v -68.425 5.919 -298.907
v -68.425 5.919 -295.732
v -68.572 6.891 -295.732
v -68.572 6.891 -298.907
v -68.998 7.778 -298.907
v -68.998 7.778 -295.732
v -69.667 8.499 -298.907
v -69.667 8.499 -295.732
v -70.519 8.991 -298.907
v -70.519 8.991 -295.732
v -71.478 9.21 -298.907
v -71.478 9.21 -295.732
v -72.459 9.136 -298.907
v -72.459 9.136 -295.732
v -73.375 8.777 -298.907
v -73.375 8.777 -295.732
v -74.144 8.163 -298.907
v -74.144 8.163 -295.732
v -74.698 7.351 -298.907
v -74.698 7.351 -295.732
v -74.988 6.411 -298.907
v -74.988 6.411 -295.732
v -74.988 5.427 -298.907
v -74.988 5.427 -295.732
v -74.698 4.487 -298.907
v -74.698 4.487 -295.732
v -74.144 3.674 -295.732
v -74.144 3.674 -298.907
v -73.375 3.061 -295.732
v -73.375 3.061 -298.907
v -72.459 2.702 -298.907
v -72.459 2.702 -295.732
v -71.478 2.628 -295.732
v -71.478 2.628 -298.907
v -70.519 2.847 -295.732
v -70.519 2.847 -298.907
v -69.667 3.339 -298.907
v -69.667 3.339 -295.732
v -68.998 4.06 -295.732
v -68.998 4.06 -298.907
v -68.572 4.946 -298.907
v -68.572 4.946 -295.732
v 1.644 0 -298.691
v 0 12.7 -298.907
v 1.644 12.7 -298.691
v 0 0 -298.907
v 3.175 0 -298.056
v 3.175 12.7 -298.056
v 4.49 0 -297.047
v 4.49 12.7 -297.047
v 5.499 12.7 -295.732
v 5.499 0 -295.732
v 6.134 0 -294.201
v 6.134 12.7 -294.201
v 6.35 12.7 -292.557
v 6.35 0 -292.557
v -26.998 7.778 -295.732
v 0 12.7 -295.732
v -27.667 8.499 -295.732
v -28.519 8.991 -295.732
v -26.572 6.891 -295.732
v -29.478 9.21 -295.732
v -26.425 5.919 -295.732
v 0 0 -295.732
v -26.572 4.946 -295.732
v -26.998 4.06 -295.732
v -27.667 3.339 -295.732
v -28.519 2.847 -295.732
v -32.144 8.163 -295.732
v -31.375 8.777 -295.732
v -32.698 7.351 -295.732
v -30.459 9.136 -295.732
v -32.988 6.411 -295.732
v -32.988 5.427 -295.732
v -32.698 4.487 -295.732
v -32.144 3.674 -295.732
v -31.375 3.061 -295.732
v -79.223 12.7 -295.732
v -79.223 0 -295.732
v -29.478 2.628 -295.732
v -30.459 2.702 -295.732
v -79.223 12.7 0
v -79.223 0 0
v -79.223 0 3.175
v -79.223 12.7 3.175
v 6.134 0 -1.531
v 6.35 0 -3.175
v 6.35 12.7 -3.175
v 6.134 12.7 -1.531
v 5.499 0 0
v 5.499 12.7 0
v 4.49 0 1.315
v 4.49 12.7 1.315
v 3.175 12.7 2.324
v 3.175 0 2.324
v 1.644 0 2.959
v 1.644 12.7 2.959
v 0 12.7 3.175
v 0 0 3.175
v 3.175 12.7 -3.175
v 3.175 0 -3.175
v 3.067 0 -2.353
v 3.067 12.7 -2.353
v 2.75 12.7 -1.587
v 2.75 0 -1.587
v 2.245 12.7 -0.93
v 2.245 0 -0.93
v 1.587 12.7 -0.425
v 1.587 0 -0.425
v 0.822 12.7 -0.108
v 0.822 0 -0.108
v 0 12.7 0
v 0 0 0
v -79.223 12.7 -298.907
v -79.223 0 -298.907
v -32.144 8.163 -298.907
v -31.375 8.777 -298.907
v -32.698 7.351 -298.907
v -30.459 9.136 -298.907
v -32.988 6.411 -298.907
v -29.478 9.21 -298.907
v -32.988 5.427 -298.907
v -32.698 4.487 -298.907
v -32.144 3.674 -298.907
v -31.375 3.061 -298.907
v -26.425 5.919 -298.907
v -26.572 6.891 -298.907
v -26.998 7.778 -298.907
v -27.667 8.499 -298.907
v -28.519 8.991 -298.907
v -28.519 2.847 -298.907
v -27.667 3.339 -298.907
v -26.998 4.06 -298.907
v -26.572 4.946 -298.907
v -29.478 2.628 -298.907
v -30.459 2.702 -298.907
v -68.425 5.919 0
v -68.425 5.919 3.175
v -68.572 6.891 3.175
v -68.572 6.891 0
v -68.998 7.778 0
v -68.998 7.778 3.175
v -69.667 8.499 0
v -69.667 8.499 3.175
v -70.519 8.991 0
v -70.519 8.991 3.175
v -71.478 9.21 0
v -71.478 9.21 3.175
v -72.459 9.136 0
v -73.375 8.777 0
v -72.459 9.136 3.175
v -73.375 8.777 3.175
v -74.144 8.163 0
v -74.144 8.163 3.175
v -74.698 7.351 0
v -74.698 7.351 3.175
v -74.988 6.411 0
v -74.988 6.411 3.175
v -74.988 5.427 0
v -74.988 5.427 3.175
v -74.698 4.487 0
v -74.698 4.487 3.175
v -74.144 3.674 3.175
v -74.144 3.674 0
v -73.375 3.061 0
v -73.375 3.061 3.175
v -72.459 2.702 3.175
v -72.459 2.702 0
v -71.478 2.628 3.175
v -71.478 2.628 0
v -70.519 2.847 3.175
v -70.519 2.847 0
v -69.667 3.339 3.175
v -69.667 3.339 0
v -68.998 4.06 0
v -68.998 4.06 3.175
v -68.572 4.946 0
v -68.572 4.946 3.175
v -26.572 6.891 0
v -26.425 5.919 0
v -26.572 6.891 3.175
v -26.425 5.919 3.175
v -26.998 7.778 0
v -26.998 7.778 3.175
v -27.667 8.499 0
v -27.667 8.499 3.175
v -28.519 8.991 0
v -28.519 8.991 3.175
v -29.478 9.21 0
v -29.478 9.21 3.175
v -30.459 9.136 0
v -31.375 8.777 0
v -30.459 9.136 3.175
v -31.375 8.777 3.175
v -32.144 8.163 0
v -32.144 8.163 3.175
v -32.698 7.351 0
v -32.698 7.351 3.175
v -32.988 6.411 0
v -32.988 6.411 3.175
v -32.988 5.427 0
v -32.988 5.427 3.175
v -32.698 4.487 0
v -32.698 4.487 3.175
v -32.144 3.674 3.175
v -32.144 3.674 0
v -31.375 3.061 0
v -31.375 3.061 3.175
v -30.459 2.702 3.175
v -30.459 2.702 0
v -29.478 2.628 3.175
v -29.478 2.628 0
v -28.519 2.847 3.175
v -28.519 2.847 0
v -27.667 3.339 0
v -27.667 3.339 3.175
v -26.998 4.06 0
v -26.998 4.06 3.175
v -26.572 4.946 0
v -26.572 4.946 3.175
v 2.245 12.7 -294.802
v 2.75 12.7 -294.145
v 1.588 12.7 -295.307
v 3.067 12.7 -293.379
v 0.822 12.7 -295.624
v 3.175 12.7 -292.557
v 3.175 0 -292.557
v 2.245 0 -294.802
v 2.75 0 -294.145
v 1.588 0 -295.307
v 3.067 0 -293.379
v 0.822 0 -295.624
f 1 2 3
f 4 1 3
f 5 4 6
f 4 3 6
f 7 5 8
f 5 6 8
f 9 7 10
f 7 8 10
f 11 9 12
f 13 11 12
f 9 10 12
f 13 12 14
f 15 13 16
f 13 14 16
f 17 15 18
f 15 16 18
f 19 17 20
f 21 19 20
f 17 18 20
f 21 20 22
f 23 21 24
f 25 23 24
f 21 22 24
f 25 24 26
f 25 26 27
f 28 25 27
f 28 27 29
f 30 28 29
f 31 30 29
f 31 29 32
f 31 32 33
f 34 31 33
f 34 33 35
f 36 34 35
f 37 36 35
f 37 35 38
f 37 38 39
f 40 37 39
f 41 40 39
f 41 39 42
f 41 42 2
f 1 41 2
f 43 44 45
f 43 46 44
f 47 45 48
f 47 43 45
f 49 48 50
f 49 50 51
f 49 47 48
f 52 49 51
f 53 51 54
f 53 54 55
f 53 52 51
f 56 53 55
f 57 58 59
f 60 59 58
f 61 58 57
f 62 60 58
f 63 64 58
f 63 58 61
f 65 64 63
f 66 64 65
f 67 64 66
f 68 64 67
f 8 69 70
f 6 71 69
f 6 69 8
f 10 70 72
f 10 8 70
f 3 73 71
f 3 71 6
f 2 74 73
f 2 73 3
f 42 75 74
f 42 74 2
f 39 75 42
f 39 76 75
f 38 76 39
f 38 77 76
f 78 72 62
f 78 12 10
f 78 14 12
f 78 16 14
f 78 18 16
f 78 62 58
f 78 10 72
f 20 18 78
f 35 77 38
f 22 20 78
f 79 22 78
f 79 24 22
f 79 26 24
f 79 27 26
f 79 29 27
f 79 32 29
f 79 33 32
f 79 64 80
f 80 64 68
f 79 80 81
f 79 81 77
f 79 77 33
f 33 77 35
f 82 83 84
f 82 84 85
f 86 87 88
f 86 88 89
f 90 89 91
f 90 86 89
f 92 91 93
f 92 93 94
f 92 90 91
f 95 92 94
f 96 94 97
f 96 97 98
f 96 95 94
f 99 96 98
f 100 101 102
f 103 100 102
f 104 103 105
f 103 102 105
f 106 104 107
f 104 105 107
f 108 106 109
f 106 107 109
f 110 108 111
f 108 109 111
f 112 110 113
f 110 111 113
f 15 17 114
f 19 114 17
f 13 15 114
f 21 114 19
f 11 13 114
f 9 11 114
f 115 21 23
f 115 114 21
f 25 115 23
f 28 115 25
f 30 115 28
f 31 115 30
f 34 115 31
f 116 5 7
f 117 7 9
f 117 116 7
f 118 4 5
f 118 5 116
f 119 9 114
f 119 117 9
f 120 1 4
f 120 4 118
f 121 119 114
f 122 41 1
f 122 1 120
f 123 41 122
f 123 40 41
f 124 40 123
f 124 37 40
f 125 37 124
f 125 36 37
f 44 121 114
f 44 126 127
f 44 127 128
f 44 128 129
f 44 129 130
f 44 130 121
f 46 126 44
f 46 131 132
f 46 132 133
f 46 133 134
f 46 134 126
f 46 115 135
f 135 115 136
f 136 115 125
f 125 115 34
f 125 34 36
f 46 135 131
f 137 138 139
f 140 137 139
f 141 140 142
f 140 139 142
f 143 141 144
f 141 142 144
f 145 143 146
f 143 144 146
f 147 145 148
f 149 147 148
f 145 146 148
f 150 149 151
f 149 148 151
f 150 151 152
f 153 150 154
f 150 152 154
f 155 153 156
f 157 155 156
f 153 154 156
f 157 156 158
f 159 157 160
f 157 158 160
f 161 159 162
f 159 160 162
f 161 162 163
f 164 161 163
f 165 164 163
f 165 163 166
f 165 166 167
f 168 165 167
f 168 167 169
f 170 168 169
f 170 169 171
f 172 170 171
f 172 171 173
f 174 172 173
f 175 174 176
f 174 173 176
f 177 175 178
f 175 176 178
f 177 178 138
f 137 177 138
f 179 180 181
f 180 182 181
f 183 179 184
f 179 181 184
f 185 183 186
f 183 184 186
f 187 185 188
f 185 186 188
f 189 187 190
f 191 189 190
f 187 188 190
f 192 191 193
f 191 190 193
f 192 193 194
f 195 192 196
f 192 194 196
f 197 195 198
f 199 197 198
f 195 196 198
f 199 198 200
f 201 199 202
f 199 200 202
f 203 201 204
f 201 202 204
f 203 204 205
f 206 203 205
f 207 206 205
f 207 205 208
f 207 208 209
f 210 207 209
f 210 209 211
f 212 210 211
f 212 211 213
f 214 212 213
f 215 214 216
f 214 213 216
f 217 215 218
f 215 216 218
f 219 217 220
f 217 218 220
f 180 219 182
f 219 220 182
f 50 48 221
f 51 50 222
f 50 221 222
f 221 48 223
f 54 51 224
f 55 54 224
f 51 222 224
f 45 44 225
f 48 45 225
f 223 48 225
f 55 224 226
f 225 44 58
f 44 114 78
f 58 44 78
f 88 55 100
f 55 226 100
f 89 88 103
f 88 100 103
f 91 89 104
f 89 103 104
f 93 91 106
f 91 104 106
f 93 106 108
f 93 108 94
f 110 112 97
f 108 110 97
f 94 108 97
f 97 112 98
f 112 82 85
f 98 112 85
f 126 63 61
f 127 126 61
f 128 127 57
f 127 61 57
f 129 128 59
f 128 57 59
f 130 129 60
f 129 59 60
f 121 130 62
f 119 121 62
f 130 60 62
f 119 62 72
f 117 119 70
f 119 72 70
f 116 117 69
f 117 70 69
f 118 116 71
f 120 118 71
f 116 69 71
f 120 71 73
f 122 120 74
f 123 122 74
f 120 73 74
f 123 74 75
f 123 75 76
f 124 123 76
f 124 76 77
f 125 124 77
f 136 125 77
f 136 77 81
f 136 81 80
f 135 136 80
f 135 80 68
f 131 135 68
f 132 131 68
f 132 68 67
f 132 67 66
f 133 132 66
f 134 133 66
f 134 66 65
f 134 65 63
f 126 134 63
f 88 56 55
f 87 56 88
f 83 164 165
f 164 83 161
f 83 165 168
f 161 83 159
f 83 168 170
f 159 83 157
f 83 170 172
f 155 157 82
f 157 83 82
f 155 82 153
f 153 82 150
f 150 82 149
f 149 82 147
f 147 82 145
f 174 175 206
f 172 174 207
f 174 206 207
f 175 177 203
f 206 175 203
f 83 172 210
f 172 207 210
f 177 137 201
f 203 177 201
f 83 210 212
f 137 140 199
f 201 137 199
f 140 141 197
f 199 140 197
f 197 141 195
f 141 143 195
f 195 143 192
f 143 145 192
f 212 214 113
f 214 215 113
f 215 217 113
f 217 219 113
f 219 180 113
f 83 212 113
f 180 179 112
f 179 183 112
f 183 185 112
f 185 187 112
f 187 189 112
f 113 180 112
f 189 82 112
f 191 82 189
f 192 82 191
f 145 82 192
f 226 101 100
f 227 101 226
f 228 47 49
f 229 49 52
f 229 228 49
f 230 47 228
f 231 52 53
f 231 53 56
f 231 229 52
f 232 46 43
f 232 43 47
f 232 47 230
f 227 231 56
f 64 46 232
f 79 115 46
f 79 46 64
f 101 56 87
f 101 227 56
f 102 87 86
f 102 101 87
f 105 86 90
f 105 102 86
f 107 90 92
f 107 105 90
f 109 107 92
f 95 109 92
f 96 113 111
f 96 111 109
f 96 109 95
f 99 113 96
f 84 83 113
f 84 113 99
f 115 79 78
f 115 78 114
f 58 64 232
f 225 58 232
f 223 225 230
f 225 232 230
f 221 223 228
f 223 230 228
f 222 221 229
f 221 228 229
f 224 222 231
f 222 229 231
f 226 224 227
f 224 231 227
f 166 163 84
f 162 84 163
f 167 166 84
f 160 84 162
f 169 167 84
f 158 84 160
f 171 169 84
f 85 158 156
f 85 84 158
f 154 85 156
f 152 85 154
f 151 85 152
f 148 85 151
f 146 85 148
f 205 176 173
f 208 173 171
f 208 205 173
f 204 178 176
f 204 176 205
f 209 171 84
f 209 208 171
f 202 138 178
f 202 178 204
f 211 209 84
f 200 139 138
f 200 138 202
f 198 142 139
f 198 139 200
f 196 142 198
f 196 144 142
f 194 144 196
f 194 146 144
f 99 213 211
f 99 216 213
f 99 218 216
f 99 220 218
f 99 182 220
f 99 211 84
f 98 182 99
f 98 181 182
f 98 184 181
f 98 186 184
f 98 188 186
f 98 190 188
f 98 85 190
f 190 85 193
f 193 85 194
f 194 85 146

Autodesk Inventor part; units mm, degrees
ref_plane "YZ Plane" through (0, 0, 0) normal (1, 0, 0) x (0, 1, 0)
ref_plane "XZ Plane" through (0, 0, 0) normal (0, 1, 0) x (-1, 0, 0)
ref_plane "XY Plane" through (0, 0, 0) normal (0, 0, 1) x (1, 0, 0)
sketch "Sketch1" plane through (0, 0, 0) normal (0, 0, 1) x (1, 0, 0)
  line L0 (0, 0) -> (-79.2226, 0)
  line L1 (-79.2226, 0) -> (-79.2226, 12.7)
  line L2 (-79.2226, 12.7) -> (0, 12.7)
  line L3 (0, 12.7) -> (0, 0)
  line L4 (0, 12.7) -> (-29.718, 12.7)
  line L5 (-79.2226, 12.7) -> (-71.7296, 12.7)
  dimension "d1" = 79.2226
  dimension "d2" = 12.7
  dimension "d5" = 7.493
extrude "Plate5" add sketch "Sketch1" along normal blind 3.175
sketch "Sketch6" plane through (3.175, 0, -3.175) normal (1, 0, 0) x (0, 1, 0)
  line L0 (12.7, 0) -> (0, 0)
  line L1 (0, 0) -> (0, -289.3822)
  line L2 (0, -289.3822) -> (12.7, -289.3822)
  line L3 (12.7, -289.3822) -> (12.7, 0)
edge flange "Flange4" height 295.7322 angle 90 thickness 3.175 bend radius 3.175 thickness toward (1, 0, 0) relief tear relief width 3.175 relief depth 1.5875 edges at (0, 6.35, 0) wall of the first edge with corners at (3.175, 12.7, -3.175) (3.175, 0, -3.175) (3.175, 0, -292.5572) (3.175, 12.7, -292.5572)
bend "Bend4"
corner "Corner4"
sketch "Sketch7" plane through (0, 0, -295.7322) normal (0, 0, -1) x (-1, 0, 0)
  line L0 (0, 12.7) -> (0, 0)
  line L1 (0, 0) -> (79.2226, 0)
  line L2 (79.2226, 0) -> (79.2226, 12.7)
  line L3 (79.2226, 12.7) -> (0, 12.7)
edge flange "Flange5" height 85.5726 angle 90 thickness 3.175 bend radius 3.175 thickness toward (0, 0, -1) relief tear relief width 3.175 relief depth 1.5875 edges at (3.175, 6.35, -292.5572) wall of the first edge with corners at (0, 12.7, -295.7322) (0, 0, -295.7322) (-79.2226, 0, -295.7322) (-79.2226, 12.7, -295.7322)
bend "Bend5"
corner "Corner5"
sketch "Sketch8" plane through (0, 0, 3.175) normal (0, 0, 1) x (1, 0, 0)
  circle A0 centre (-71.725, 5.9188) radius 3.3 projected
  circle A1 centre (-29.725, 5.9188) radius 3.3 projected
extrude "Extrusion2" cut sketch "Sketch8" against normal blind 2539974.6
equation "\"d43\" = BendReliefWidth"
equation "\"d44\" = BendReliefDepth"
equation "\"d45\" = MinimumRemnant"
equation "\"d46\" = BendRadius"
equation "\"d49\" = BendRadius"
equation "\"d50\" = CornerReliefSize"
equation "\"d51\" = GapSize"
equation "\"d52\" = JacobiRadiusSize"
equation "\"d53\" = BendReliefWidth"
equation "\"d54\" = BendReliefDepth"
equation "\"d55\" = MinimumRemnant"
equation "\"d56\" = BendRadius"
equation "\"d59\" = BendRadius"
equation "\"d60\" = CornerReliefSize"
equation "\"d61\" = GapSize"
equation "\"d62\" = JacobiRadiusSize"
equation "\"BendRadius\" = Thickness"
equation "\"BendReliefWidth\" = Thickness"
equation "\"BendReliefDepth\" = 0.5 * Thickness"
equation "\"CornerReliefSize\" = 4 * Thickness"
equation "\"MinimumRemnant\" = 2 * Thickness"
equation "\"TransitionRadius\" = BendRadius"
equation "\"JacobiRadiusSize\" = BendRadius"
equation "\"GapSize\" = Thickness"
equation "\"d8\" = BendRadius"
equation "\"d42\" = BendRadius"
equation "\"Thickness\" = 3.175"
properties part number "tie-together tier 2 wide" material "Aluminum 6061"
